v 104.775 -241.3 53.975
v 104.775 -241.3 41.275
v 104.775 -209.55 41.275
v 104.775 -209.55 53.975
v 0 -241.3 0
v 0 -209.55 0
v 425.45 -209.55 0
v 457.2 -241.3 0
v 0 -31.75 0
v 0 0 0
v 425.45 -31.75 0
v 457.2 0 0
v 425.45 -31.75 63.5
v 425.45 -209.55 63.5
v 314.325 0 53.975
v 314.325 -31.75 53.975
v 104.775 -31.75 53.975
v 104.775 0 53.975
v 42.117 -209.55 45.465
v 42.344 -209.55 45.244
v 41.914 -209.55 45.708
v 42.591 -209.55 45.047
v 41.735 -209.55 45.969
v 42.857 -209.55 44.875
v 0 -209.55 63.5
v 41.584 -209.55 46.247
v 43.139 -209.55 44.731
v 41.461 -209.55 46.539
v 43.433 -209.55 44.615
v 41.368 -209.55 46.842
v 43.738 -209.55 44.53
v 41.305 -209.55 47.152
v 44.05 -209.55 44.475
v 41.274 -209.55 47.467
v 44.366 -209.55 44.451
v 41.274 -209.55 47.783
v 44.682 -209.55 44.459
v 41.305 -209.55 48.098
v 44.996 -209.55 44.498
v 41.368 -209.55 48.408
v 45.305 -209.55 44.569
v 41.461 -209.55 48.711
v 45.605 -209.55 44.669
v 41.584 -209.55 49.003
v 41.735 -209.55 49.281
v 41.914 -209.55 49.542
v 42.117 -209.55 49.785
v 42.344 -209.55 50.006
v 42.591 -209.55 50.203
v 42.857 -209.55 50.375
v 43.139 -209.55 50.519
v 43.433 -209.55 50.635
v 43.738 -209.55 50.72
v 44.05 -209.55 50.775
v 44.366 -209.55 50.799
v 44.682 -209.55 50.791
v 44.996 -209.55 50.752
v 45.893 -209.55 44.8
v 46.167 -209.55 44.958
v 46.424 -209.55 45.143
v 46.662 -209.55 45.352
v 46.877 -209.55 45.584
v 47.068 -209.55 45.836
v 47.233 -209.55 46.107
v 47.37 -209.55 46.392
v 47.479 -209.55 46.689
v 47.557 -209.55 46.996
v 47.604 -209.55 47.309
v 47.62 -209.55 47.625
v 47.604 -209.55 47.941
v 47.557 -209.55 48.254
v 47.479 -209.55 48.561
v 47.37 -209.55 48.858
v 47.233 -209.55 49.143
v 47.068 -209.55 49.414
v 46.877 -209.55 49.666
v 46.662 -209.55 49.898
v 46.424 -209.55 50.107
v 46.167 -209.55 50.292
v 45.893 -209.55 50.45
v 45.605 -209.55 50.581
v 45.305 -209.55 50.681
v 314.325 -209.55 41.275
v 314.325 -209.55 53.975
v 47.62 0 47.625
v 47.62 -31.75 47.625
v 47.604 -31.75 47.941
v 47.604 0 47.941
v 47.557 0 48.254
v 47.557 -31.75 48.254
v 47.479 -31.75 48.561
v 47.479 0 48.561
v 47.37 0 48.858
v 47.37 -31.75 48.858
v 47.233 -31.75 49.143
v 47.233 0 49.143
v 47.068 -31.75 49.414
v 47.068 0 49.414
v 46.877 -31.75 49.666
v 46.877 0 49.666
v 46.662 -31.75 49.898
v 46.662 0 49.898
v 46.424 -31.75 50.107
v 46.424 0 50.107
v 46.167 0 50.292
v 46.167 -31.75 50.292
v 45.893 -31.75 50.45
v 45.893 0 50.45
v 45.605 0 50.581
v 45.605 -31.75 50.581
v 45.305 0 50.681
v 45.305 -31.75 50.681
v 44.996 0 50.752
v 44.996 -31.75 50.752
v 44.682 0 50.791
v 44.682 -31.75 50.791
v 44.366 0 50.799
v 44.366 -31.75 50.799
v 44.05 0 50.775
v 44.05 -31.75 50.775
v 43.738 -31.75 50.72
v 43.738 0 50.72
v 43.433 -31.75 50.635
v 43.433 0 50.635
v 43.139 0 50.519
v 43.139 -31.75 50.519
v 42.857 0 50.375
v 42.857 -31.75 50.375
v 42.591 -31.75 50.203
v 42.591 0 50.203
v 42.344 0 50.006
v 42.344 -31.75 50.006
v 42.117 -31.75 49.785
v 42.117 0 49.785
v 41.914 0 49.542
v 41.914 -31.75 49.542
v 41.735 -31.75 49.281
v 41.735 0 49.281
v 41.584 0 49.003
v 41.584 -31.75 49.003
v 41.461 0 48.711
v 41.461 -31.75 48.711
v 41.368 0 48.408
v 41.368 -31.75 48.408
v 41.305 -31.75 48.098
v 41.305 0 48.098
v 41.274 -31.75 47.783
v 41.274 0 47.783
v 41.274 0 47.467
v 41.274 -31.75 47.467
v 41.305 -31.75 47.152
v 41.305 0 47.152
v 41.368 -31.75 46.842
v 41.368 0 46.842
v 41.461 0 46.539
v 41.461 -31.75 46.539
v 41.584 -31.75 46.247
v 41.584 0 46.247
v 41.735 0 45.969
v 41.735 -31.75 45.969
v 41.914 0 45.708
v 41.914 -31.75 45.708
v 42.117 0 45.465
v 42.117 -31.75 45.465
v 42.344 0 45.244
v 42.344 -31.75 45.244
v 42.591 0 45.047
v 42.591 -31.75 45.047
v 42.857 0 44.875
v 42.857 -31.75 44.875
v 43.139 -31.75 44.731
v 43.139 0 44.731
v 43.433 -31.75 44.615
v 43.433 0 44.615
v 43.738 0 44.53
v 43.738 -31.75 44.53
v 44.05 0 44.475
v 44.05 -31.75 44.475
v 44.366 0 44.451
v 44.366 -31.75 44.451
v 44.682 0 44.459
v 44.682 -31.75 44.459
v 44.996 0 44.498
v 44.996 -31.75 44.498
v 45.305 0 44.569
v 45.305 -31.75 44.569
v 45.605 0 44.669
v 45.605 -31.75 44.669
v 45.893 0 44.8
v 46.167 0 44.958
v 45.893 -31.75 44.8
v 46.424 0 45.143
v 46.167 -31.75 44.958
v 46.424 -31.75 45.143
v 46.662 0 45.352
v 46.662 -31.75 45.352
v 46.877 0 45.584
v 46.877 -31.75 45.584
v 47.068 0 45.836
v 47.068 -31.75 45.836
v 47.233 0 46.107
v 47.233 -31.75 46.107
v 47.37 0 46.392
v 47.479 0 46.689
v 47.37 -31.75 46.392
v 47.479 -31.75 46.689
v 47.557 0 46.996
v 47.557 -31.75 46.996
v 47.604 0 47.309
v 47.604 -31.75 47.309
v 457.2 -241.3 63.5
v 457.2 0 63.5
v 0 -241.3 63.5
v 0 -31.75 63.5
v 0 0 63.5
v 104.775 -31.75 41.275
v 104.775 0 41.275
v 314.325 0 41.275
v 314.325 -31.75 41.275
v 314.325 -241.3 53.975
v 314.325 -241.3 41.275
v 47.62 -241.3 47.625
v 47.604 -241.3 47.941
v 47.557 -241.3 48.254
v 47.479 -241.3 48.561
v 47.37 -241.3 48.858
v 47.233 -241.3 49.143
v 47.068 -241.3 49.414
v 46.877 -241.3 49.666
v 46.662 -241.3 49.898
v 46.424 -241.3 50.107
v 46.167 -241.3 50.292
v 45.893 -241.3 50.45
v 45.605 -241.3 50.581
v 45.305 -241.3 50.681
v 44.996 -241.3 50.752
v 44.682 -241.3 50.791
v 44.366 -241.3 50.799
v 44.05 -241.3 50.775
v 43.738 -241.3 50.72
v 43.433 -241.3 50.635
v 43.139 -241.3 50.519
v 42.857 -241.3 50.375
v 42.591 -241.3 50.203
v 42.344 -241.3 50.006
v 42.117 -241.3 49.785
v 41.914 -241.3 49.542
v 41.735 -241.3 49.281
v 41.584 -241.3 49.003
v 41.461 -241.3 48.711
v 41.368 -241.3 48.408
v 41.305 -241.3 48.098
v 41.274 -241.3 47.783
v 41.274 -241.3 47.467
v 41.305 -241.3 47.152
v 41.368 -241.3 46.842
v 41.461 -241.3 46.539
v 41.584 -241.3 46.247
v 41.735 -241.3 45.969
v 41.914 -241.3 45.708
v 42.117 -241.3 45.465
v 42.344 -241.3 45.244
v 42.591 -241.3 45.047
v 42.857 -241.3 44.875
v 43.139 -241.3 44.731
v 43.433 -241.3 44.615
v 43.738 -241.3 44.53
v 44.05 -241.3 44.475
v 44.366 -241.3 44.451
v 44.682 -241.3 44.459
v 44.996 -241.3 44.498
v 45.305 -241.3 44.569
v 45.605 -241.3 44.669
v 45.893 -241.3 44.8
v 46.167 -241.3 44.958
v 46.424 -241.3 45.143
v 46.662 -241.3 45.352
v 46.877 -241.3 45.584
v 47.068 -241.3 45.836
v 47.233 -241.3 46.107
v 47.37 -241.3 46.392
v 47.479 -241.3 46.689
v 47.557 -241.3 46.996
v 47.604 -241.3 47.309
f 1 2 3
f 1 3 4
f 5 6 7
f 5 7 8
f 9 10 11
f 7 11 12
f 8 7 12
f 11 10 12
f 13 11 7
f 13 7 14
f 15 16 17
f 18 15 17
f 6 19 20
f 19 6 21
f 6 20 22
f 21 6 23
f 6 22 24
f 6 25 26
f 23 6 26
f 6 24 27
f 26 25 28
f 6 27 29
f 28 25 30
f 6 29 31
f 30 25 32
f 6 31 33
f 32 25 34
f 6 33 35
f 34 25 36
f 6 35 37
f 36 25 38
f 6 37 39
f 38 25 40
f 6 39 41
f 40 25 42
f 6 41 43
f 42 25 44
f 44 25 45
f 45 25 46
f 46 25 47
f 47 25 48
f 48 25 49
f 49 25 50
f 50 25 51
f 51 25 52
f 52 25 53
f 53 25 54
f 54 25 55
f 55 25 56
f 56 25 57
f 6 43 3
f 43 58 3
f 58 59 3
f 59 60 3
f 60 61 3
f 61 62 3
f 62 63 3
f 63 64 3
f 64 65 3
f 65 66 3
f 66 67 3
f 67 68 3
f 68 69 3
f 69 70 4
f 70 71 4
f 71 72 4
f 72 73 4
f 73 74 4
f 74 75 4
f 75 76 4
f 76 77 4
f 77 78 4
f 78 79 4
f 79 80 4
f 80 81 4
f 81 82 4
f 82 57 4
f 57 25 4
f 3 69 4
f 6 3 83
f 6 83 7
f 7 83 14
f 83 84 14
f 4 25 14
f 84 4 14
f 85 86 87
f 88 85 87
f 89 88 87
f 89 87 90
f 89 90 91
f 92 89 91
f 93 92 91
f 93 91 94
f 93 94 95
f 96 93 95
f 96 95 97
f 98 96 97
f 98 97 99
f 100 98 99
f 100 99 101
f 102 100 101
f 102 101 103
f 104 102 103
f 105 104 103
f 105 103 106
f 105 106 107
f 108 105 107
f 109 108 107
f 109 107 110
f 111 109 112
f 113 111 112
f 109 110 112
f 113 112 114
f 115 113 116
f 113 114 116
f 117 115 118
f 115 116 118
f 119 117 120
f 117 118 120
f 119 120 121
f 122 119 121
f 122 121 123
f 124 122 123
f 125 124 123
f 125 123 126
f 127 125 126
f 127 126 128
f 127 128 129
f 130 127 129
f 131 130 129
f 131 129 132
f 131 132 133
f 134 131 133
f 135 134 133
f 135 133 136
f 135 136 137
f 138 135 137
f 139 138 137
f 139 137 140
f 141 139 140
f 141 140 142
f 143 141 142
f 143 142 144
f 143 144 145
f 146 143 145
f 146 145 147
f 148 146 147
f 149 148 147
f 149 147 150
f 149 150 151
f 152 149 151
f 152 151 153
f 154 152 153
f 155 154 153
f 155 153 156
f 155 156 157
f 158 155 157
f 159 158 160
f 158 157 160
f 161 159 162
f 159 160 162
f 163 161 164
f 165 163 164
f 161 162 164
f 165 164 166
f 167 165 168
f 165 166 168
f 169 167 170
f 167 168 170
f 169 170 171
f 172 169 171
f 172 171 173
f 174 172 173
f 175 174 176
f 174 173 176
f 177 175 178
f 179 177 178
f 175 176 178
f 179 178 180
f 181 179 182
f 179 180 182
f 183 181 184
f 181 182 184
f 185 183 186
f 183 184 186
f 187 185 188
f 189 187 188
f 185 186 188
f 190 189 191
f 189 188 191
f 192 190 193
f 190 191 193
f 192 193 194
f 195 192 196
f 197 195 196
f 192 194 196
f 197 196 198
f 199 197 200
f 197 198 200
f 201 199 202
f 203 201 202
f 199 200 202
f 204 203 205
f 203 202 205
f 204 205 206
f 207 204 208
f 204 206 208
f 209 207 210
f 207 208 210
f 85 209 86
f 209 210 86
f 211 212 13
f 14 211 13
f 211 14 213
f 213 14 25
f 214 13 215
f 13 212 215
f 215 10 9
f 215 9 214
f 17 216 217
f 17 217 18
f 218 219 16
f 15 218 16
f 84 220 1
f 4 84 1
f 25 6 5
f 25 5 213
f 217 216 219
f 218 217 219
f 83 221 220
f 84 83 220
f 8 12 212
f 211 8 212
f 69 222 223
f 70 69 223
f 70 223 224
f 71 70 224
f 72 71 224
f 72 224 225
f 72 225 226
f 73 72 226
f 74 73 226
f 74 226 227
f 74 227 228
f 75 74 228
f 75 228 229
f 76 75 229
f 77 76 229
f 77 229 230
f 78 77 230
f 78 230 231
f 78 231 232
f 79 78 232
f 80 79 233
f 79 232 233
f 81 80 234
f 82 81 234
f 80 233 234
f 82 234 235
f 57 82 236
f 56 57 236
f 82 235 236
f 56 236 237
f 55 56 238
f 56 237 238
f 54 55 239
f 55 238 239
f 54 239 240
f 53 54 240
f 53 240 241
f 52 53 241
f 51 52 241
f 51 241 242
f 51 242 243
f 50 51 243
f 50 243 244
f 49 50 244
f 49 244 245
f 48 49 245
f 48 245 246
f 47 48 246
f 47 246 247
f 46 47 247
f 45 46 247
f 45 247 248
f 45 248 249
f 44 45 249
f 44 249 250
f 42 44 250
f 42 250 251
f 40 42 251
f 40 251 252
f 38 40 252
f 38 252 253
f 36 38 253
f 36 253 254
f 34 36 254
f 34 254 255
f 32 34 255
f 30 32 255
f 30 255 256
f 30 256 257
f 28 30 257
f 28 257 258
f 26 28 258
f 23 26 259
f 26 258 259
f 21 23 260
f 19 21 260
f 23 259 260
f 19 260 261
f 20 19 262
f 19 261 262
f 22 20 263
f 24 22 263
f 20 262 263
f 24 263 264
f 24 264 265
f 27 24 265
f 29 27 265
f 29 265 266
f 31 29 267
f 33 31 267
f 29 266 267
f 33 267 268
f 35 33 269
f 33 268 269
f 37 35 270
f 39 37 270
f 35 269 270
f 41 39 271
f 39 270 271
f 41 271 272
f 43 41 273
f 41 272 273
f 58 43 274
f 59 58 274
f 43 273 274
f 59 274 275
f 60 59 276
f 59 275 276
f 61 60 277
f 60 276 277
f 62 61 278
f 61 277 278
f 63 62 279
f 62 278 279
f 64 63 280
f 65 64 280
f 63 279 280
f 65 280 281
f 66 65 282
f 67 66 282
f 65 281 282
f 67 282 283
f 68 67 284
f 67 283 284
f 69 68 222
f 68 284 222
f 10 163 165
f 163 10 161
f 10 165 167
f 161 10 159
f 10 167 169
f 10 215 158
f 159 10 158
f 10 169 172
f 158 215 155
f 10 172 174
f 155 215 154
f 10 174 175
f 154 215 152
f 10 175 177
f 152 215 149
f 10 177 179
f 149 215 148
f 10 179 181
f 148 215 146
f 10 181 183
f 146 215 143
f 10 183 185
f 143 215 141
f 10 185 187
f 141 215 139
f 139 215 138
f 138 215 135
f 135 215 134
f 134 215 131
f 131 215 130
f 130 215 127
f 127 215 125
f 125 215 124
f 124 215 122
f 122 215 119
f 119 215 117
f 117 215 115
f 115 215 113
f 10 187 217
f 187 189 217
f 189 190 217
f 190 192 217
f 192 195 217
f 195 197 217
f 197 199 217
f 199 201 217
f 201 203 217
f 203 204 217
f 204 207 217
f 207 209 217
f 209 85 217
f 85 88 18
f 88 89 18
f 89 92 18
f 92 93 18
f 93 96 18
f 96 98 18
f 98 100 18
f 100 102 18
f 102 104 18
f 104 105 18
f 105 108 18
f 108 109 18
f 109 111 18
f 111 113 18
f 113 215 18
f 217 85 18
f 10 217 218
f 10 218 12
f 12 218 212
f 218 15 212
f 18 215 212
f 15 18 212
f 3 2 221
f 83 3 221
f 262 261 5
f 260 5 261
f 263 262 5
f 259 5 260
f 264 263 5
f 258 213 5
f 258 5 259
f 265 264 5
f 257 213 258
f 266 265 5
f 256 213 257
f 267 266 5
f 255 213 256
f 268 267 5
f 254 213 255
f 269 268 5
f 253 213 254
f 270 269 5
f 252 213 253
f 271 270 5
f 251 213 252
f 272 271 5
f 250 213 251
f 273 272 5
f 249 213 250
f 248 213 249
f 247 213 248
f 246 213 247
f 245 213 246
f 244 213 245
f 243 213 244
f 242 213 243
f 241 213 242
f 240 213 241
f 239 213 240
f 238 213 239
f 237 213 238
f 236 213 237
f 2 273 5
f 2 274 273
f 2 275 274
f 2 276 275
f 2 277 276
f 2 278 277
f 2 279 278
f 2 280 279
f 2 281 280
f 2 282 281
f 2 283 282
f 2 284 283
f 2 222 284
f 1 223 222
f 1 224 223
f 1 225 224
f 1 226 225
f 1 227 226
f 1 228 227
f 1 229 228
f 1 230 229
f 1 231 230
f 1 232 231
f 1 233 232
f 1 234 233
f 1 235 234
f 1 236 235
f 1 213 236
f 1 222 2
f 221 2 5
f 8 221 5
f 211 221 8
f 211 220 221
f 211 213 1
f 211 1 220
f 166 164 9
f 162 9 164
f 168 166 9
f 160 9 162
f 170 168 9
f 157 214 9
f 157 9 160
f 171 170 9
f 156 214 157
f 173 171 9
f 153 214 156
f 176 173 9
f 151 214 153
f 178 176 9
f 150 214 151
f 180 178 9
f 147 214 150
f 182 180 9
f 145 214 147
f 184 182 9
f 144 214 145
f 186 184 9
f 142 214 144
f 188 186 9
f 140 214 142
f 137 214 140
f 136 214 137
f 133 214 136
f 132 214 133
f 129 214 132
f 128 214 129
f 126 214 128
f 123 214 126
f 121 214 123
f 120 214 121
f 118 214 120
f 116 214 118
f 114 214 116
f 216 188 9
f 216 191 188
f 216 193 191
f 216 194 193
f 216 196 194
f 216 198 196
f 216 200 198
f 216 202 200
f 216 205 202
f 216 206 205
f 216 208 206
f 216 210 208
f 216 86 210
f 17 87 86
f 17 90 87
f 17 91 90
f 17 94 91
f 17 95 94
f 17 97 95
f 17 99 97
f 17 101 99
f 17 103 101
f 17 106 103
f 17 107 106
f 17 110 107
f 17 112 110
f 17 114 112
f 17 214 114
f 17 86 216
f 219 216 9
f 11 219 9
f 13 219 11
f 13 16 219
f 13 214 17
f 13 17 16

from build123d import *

# Parameters (mm, degrees)
F0_W      = 457.2
F0_H      = 63.5
F1_DEPTH  = 31.75
F2_W      = 31.75
F2_H      = 63.5
F3_DEPTH  = 177.8
F4_W      = 31.75
F4_H      = 63.5
F4_W_2    = 425.45
F5_DEPTH  = 31.75
F7_DEPTH  = 254
F9_DEPTH  = 508
F10_W     = 76.2
F10_H     = 12.7
F11_DEPTH = 346.71


with BuildPart() as f1:
    # F0 (on Front) → F1 (new body)
    with BuildSketch(Plane.XZ):
        with Locations((228.6, 31.75)):
            Rectangle(F0_W, F0_H)
    extrude(amount=F1_DEPTH)

    # F2 (on face) → F3 (join)
    with BuildSketch(Plane.XZ.offset(31.75)):
        with Locations((441.325, 31.75)):
            Rectangle(F2_W, F2_H)
    extrude(amount=F3_DEPTH)

    # F4 (on face) → F5 (join)
    with BuildSketch(Plane.XZ.offset(209.55)):
        with Locations((441.325, 31.75)):
            Rectangle(F4_W, F4_H)
        with Locations((212.725, 31.75)):
            Rectangle(F4_W_2, F4_H)
    extrude(amount=F5_DEPTH)

    # F6 (on face) → F7 (cut)
    with BuildSketch(Plane.XZ.offset(241.3)):
        Polygon((180.975, 41.275), (314.325, 41.275), (314.325, 53.975), (247.65, 53.975), (180.975, 53.975), align=None)
    extrude(amount=-F7_DEPTH, mode=Mode.SUBTRACT)

    # F8 (on face) → F9 (cut)
    with BuildSketch(Plane.XZ.offset(241.3)):
        with BuildLine():
            ThreePointArc((41.269663, 47.625), (44.444663, 44.45), (47.619663, 47.625))
            ThreePointArc((47.619663, 47.625), (44.444663, 50.8), (41.269663, 47.625))
        make_face()
    extrude(amount=-F9_DEPTH, mode=Mode.SUBTRACT)

    # F10 (on face) → F11 (cut)
    with BuildSketch(Plane.XZ.offset(241.3)):
        with Locations((142.875, 47.625)):
            Rectangle(F10_W, F10_H)
    extrude(amount=-F11_DEPTH, mode=Mode.SUBTRACT)


solid = f1.part
